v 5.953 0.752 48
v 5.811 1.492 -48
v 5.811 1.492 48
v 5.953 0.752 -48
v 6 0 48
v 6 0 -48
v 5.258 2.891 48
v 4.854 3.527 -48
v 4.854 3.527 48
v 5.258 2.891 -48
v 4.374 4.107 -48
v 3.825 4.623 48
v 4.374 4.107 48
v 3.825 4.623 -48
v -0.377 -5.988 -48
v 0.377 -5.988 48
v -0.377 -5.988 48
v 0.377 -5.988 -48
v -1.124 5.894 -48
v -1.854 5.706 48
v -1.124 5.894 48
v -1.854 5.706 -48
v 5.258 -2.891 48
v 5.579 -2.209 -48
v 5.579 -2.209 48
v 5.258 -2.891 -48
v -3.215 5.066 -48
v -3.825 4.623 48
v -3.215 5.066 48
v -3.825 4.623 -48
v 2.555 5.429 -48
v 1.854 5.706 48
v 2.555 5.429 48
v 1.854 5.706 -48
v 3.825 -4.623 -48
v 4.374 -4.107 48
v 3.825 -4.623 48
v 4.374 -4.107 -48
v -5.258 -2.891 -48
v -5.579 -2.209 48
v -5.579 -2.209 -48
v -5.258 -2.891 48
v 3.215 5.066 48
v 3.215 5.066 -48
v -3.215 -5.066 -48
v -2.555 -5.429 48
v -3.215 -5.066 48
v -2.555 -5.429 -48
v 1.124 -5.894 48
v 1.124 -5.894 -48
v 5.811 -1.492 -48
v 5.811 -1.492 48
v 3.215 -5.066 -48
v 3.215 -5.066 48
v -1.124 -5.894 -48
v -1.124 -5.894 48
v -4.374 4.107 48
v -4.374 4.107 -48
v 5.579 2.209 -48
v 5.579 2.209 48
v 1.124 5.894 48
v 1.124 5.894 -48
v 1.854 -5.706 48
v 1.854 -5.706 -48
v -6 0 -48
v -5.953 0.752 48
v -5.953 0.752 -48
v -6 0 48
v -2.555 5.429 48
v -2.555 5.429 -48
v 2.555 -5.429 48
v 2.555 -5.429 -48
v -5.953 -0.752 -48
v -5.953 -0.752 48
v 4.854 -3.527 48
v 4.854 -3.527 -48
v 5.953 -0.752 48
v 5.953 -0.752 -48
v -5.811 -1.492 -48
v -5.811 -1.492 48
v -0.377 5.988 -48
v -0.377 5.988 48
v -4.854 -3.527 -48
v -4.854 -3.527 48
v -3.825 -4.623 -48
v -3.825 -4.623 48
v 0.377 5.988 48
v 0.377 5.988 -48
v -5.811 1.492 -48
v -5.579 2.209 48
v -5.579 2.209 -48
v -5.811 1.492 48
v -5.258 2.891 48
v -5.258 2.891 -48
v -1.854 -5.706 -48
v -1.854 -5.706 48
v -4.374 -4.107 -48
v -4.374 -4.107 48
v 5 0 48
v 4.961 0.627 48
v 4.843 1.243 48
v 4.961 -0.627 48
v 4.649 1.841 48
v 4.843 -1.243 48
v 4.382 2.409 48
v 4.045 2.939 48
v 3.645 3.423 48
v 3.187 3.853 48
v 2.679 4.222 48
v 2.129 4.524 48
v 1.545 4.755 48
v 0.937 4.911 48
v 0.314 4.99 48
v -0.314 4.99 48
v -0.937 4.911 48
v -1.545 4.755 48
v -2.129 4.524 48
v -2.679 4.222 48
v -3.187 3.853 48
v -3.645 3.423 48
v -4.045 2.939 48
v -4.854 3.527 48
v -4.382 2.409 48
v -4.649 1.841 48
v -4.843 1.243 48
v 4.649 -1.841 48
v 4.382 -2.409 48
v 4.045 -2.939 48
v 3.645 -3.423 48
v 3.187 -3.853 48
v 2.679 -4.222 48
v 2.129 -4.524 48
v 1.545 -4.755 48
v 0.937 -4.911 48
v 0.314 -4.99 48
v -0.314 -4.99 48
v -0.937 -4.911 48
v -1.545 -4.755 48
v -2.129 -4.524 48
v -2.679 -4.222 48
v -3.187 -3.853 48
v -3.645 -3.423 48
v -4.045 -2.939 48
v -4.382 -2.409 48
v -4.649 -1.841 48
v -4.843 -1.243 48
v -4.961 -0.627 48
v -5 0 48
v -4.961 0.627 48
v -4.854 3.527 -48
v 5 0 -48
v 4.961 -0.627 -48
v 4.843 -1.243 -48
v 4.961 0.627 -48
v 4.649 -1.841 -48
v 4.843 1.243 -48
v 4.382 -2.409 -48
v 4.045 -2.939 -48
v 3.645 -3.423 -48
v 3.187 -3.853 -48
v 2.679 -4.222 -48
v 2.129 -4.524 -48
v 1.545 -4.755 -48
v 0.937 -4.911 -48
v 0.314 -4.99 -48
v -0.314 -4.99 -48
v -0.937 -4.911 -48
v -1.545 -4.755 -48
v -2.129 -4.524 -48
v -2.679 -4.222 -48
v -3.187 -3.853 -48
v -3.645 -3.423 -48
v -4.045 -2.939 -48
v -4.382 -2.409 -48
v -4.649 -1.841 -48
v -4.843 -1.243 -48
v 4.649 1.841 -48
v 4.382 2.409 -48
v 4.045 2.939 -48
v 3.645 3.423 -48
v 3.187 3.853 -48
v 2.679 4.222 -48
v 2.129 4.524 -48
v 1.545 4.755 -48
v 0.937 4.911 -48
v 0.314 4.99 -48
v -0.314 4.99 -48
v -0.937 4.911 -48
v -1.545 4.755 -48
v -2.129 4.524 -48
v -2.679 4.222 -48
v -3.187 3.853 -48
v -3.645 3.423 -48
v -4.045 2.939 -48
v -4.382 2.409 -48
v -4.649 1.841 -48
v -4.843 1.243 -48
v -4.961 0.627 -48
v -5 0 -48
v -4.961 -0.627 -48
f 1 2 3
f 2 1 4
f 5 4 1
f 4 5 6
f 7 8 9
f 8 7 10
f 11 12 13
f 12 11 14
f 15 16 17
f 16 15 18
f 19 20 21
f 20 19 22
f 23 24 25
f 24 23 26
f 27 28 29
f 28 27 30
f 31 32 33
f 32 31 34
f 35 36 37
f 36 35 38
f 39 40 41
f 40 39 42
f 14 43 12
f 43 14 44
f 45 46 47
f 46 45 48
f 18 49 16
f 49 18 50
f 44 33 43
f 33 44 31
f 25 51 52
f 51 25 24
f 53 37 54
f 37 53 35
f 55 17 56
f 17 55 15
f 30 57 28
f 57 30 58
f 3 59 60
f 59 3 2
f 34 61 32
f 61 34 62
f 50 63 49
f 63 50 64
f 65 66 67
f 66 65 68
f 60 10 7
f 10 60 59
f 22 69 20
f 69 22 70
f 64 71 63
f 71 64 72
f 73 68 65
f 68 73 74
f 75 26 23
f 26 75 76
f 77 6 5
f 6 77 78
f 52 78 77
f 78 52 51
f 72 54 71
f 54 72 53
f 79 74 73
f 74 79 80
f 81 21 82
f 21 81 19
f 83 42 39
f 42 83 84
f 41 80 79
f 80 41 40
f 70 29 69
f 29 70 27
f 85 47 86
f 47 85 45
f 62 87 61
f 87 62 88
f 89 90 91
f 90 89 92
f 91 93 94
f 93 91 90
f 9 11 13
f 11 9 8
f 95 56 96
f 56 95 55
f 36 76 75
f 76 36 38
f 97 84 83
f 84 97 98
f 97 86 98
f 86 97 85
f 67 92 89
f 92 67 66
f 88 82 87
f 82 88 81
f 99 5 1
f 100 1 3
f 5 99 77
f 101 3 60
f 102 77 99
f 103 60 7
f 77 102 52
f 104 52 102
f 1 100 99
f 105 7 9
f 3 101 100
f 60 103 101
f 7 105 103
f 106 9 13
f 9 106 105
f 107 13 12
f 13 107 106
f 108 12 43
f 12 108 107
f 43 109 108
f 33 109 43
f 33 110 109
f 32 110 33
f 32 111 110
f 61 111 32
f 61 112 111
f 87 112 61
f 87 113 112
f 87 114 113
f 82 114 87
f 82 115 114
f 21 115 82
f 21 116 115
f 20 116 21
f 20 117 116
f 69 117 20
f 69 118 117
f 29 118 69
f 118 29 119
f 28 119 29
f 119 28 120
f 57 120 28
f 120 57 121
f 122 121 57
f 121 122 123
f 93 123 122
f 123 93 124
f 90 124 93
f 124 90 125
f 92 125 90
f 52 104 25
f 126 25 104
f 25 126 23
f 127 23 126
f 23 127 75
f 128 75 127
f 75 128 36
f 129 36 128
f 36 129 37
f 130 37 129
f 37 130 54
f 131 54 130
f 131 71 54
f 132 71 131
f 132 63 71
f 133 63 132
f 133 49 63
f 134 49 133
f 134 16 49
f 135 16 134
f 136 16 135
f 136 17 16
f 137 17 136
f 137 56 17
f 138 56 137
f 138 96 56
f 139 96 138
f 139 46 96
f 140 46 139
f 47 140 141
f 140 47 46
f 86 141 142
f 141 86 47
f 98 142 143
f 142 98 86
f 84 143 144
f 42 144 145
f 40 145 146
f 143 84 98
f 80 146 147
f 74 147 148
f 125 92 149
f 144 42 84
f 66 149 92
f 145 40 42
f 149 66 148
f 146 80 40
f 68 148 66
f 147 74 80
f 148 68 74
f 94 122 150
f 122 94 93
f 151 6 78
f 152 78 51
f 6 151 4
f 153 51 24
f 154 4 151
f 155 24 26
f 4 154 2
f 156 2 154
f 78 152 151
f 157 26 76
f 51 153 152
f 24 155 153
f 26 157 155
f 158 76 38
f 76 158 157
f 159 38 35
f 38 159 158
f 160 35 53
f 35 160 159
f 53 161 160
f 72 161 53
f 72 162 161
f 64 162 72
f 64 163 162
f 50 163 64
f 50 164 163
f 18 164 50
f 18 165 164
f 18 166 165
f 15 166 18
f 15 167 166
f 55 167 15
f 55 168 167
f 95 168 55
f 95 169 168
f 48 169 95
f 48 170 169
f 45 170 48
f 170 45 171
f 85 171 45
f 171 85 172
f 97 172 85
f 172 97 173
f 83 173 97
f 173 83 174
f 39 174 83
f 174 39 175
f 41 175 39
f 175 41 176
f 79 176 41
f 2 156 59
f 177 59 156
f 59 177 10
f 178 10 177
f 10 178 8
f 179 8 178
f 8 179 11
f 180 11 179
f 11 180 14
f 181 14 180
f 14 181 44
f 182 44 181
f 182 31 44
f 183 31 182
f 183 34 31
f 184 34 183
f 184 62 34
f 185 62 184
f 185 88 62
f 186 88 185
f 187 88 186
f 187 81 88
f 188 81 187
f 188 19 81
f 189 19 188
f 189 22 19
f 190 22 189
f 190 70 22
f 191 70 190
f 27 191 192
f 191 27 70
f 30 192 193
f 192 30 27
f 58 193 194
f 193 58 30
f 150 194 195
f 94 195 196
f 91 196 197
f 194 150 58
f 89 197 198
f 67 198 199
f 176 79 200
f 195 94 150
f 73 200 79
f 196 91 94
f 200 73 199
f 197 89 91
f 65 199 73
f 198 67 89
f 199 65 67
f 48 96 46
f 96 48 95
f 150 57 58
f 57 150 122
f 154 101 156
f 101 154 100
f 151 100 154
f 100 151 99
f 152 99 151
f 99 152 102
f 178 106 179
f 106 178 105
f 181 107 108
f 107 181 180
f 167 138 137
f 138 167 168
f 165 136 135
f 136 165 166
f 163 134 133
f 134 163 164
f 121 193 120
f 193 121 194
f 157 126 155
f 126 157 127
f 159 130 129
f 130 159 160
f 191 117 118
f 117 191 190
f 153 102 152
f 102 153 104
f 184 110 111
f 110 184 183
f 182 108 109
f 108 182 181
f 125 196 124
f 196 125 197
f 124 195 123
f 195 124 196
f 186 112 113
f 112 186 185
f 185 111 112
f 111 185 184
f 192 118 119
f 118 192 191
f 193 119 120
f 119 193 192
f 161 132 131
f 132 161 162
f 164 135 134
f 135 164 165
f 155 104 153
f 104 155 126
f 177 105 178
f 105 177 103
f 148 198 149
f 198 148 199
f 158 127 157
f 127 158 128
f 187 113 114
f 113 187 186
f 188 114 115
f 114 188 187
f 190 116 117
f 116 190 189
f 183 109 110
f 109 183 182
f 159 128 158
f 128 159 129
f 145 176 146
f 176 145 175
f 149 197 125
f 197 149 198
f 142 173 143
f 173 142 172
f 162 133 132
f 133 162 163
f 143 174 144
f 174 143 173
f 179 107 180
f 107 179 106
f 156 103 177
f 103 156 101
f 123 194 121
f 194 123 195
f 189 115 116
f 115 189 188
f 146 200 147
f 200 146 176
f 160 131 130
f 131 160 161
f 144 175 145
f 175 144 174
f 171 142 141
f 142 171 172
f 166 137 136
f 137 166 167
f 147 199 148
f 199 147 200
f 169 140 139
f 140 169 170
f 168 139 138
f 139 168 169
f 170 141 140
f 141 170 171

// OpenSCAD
$fn = 50;


difference() {
	union() {
		translate(v = [0, 0, -48.0000000000]) {
			cylinder(h = 96, r = 6.0000000000);
		}
	}
	union() {
		translate(v = [0, 0, -100.0000000000]) {
			cylinder(h = 200, r = 5.0000000000);
		}
	}
}
